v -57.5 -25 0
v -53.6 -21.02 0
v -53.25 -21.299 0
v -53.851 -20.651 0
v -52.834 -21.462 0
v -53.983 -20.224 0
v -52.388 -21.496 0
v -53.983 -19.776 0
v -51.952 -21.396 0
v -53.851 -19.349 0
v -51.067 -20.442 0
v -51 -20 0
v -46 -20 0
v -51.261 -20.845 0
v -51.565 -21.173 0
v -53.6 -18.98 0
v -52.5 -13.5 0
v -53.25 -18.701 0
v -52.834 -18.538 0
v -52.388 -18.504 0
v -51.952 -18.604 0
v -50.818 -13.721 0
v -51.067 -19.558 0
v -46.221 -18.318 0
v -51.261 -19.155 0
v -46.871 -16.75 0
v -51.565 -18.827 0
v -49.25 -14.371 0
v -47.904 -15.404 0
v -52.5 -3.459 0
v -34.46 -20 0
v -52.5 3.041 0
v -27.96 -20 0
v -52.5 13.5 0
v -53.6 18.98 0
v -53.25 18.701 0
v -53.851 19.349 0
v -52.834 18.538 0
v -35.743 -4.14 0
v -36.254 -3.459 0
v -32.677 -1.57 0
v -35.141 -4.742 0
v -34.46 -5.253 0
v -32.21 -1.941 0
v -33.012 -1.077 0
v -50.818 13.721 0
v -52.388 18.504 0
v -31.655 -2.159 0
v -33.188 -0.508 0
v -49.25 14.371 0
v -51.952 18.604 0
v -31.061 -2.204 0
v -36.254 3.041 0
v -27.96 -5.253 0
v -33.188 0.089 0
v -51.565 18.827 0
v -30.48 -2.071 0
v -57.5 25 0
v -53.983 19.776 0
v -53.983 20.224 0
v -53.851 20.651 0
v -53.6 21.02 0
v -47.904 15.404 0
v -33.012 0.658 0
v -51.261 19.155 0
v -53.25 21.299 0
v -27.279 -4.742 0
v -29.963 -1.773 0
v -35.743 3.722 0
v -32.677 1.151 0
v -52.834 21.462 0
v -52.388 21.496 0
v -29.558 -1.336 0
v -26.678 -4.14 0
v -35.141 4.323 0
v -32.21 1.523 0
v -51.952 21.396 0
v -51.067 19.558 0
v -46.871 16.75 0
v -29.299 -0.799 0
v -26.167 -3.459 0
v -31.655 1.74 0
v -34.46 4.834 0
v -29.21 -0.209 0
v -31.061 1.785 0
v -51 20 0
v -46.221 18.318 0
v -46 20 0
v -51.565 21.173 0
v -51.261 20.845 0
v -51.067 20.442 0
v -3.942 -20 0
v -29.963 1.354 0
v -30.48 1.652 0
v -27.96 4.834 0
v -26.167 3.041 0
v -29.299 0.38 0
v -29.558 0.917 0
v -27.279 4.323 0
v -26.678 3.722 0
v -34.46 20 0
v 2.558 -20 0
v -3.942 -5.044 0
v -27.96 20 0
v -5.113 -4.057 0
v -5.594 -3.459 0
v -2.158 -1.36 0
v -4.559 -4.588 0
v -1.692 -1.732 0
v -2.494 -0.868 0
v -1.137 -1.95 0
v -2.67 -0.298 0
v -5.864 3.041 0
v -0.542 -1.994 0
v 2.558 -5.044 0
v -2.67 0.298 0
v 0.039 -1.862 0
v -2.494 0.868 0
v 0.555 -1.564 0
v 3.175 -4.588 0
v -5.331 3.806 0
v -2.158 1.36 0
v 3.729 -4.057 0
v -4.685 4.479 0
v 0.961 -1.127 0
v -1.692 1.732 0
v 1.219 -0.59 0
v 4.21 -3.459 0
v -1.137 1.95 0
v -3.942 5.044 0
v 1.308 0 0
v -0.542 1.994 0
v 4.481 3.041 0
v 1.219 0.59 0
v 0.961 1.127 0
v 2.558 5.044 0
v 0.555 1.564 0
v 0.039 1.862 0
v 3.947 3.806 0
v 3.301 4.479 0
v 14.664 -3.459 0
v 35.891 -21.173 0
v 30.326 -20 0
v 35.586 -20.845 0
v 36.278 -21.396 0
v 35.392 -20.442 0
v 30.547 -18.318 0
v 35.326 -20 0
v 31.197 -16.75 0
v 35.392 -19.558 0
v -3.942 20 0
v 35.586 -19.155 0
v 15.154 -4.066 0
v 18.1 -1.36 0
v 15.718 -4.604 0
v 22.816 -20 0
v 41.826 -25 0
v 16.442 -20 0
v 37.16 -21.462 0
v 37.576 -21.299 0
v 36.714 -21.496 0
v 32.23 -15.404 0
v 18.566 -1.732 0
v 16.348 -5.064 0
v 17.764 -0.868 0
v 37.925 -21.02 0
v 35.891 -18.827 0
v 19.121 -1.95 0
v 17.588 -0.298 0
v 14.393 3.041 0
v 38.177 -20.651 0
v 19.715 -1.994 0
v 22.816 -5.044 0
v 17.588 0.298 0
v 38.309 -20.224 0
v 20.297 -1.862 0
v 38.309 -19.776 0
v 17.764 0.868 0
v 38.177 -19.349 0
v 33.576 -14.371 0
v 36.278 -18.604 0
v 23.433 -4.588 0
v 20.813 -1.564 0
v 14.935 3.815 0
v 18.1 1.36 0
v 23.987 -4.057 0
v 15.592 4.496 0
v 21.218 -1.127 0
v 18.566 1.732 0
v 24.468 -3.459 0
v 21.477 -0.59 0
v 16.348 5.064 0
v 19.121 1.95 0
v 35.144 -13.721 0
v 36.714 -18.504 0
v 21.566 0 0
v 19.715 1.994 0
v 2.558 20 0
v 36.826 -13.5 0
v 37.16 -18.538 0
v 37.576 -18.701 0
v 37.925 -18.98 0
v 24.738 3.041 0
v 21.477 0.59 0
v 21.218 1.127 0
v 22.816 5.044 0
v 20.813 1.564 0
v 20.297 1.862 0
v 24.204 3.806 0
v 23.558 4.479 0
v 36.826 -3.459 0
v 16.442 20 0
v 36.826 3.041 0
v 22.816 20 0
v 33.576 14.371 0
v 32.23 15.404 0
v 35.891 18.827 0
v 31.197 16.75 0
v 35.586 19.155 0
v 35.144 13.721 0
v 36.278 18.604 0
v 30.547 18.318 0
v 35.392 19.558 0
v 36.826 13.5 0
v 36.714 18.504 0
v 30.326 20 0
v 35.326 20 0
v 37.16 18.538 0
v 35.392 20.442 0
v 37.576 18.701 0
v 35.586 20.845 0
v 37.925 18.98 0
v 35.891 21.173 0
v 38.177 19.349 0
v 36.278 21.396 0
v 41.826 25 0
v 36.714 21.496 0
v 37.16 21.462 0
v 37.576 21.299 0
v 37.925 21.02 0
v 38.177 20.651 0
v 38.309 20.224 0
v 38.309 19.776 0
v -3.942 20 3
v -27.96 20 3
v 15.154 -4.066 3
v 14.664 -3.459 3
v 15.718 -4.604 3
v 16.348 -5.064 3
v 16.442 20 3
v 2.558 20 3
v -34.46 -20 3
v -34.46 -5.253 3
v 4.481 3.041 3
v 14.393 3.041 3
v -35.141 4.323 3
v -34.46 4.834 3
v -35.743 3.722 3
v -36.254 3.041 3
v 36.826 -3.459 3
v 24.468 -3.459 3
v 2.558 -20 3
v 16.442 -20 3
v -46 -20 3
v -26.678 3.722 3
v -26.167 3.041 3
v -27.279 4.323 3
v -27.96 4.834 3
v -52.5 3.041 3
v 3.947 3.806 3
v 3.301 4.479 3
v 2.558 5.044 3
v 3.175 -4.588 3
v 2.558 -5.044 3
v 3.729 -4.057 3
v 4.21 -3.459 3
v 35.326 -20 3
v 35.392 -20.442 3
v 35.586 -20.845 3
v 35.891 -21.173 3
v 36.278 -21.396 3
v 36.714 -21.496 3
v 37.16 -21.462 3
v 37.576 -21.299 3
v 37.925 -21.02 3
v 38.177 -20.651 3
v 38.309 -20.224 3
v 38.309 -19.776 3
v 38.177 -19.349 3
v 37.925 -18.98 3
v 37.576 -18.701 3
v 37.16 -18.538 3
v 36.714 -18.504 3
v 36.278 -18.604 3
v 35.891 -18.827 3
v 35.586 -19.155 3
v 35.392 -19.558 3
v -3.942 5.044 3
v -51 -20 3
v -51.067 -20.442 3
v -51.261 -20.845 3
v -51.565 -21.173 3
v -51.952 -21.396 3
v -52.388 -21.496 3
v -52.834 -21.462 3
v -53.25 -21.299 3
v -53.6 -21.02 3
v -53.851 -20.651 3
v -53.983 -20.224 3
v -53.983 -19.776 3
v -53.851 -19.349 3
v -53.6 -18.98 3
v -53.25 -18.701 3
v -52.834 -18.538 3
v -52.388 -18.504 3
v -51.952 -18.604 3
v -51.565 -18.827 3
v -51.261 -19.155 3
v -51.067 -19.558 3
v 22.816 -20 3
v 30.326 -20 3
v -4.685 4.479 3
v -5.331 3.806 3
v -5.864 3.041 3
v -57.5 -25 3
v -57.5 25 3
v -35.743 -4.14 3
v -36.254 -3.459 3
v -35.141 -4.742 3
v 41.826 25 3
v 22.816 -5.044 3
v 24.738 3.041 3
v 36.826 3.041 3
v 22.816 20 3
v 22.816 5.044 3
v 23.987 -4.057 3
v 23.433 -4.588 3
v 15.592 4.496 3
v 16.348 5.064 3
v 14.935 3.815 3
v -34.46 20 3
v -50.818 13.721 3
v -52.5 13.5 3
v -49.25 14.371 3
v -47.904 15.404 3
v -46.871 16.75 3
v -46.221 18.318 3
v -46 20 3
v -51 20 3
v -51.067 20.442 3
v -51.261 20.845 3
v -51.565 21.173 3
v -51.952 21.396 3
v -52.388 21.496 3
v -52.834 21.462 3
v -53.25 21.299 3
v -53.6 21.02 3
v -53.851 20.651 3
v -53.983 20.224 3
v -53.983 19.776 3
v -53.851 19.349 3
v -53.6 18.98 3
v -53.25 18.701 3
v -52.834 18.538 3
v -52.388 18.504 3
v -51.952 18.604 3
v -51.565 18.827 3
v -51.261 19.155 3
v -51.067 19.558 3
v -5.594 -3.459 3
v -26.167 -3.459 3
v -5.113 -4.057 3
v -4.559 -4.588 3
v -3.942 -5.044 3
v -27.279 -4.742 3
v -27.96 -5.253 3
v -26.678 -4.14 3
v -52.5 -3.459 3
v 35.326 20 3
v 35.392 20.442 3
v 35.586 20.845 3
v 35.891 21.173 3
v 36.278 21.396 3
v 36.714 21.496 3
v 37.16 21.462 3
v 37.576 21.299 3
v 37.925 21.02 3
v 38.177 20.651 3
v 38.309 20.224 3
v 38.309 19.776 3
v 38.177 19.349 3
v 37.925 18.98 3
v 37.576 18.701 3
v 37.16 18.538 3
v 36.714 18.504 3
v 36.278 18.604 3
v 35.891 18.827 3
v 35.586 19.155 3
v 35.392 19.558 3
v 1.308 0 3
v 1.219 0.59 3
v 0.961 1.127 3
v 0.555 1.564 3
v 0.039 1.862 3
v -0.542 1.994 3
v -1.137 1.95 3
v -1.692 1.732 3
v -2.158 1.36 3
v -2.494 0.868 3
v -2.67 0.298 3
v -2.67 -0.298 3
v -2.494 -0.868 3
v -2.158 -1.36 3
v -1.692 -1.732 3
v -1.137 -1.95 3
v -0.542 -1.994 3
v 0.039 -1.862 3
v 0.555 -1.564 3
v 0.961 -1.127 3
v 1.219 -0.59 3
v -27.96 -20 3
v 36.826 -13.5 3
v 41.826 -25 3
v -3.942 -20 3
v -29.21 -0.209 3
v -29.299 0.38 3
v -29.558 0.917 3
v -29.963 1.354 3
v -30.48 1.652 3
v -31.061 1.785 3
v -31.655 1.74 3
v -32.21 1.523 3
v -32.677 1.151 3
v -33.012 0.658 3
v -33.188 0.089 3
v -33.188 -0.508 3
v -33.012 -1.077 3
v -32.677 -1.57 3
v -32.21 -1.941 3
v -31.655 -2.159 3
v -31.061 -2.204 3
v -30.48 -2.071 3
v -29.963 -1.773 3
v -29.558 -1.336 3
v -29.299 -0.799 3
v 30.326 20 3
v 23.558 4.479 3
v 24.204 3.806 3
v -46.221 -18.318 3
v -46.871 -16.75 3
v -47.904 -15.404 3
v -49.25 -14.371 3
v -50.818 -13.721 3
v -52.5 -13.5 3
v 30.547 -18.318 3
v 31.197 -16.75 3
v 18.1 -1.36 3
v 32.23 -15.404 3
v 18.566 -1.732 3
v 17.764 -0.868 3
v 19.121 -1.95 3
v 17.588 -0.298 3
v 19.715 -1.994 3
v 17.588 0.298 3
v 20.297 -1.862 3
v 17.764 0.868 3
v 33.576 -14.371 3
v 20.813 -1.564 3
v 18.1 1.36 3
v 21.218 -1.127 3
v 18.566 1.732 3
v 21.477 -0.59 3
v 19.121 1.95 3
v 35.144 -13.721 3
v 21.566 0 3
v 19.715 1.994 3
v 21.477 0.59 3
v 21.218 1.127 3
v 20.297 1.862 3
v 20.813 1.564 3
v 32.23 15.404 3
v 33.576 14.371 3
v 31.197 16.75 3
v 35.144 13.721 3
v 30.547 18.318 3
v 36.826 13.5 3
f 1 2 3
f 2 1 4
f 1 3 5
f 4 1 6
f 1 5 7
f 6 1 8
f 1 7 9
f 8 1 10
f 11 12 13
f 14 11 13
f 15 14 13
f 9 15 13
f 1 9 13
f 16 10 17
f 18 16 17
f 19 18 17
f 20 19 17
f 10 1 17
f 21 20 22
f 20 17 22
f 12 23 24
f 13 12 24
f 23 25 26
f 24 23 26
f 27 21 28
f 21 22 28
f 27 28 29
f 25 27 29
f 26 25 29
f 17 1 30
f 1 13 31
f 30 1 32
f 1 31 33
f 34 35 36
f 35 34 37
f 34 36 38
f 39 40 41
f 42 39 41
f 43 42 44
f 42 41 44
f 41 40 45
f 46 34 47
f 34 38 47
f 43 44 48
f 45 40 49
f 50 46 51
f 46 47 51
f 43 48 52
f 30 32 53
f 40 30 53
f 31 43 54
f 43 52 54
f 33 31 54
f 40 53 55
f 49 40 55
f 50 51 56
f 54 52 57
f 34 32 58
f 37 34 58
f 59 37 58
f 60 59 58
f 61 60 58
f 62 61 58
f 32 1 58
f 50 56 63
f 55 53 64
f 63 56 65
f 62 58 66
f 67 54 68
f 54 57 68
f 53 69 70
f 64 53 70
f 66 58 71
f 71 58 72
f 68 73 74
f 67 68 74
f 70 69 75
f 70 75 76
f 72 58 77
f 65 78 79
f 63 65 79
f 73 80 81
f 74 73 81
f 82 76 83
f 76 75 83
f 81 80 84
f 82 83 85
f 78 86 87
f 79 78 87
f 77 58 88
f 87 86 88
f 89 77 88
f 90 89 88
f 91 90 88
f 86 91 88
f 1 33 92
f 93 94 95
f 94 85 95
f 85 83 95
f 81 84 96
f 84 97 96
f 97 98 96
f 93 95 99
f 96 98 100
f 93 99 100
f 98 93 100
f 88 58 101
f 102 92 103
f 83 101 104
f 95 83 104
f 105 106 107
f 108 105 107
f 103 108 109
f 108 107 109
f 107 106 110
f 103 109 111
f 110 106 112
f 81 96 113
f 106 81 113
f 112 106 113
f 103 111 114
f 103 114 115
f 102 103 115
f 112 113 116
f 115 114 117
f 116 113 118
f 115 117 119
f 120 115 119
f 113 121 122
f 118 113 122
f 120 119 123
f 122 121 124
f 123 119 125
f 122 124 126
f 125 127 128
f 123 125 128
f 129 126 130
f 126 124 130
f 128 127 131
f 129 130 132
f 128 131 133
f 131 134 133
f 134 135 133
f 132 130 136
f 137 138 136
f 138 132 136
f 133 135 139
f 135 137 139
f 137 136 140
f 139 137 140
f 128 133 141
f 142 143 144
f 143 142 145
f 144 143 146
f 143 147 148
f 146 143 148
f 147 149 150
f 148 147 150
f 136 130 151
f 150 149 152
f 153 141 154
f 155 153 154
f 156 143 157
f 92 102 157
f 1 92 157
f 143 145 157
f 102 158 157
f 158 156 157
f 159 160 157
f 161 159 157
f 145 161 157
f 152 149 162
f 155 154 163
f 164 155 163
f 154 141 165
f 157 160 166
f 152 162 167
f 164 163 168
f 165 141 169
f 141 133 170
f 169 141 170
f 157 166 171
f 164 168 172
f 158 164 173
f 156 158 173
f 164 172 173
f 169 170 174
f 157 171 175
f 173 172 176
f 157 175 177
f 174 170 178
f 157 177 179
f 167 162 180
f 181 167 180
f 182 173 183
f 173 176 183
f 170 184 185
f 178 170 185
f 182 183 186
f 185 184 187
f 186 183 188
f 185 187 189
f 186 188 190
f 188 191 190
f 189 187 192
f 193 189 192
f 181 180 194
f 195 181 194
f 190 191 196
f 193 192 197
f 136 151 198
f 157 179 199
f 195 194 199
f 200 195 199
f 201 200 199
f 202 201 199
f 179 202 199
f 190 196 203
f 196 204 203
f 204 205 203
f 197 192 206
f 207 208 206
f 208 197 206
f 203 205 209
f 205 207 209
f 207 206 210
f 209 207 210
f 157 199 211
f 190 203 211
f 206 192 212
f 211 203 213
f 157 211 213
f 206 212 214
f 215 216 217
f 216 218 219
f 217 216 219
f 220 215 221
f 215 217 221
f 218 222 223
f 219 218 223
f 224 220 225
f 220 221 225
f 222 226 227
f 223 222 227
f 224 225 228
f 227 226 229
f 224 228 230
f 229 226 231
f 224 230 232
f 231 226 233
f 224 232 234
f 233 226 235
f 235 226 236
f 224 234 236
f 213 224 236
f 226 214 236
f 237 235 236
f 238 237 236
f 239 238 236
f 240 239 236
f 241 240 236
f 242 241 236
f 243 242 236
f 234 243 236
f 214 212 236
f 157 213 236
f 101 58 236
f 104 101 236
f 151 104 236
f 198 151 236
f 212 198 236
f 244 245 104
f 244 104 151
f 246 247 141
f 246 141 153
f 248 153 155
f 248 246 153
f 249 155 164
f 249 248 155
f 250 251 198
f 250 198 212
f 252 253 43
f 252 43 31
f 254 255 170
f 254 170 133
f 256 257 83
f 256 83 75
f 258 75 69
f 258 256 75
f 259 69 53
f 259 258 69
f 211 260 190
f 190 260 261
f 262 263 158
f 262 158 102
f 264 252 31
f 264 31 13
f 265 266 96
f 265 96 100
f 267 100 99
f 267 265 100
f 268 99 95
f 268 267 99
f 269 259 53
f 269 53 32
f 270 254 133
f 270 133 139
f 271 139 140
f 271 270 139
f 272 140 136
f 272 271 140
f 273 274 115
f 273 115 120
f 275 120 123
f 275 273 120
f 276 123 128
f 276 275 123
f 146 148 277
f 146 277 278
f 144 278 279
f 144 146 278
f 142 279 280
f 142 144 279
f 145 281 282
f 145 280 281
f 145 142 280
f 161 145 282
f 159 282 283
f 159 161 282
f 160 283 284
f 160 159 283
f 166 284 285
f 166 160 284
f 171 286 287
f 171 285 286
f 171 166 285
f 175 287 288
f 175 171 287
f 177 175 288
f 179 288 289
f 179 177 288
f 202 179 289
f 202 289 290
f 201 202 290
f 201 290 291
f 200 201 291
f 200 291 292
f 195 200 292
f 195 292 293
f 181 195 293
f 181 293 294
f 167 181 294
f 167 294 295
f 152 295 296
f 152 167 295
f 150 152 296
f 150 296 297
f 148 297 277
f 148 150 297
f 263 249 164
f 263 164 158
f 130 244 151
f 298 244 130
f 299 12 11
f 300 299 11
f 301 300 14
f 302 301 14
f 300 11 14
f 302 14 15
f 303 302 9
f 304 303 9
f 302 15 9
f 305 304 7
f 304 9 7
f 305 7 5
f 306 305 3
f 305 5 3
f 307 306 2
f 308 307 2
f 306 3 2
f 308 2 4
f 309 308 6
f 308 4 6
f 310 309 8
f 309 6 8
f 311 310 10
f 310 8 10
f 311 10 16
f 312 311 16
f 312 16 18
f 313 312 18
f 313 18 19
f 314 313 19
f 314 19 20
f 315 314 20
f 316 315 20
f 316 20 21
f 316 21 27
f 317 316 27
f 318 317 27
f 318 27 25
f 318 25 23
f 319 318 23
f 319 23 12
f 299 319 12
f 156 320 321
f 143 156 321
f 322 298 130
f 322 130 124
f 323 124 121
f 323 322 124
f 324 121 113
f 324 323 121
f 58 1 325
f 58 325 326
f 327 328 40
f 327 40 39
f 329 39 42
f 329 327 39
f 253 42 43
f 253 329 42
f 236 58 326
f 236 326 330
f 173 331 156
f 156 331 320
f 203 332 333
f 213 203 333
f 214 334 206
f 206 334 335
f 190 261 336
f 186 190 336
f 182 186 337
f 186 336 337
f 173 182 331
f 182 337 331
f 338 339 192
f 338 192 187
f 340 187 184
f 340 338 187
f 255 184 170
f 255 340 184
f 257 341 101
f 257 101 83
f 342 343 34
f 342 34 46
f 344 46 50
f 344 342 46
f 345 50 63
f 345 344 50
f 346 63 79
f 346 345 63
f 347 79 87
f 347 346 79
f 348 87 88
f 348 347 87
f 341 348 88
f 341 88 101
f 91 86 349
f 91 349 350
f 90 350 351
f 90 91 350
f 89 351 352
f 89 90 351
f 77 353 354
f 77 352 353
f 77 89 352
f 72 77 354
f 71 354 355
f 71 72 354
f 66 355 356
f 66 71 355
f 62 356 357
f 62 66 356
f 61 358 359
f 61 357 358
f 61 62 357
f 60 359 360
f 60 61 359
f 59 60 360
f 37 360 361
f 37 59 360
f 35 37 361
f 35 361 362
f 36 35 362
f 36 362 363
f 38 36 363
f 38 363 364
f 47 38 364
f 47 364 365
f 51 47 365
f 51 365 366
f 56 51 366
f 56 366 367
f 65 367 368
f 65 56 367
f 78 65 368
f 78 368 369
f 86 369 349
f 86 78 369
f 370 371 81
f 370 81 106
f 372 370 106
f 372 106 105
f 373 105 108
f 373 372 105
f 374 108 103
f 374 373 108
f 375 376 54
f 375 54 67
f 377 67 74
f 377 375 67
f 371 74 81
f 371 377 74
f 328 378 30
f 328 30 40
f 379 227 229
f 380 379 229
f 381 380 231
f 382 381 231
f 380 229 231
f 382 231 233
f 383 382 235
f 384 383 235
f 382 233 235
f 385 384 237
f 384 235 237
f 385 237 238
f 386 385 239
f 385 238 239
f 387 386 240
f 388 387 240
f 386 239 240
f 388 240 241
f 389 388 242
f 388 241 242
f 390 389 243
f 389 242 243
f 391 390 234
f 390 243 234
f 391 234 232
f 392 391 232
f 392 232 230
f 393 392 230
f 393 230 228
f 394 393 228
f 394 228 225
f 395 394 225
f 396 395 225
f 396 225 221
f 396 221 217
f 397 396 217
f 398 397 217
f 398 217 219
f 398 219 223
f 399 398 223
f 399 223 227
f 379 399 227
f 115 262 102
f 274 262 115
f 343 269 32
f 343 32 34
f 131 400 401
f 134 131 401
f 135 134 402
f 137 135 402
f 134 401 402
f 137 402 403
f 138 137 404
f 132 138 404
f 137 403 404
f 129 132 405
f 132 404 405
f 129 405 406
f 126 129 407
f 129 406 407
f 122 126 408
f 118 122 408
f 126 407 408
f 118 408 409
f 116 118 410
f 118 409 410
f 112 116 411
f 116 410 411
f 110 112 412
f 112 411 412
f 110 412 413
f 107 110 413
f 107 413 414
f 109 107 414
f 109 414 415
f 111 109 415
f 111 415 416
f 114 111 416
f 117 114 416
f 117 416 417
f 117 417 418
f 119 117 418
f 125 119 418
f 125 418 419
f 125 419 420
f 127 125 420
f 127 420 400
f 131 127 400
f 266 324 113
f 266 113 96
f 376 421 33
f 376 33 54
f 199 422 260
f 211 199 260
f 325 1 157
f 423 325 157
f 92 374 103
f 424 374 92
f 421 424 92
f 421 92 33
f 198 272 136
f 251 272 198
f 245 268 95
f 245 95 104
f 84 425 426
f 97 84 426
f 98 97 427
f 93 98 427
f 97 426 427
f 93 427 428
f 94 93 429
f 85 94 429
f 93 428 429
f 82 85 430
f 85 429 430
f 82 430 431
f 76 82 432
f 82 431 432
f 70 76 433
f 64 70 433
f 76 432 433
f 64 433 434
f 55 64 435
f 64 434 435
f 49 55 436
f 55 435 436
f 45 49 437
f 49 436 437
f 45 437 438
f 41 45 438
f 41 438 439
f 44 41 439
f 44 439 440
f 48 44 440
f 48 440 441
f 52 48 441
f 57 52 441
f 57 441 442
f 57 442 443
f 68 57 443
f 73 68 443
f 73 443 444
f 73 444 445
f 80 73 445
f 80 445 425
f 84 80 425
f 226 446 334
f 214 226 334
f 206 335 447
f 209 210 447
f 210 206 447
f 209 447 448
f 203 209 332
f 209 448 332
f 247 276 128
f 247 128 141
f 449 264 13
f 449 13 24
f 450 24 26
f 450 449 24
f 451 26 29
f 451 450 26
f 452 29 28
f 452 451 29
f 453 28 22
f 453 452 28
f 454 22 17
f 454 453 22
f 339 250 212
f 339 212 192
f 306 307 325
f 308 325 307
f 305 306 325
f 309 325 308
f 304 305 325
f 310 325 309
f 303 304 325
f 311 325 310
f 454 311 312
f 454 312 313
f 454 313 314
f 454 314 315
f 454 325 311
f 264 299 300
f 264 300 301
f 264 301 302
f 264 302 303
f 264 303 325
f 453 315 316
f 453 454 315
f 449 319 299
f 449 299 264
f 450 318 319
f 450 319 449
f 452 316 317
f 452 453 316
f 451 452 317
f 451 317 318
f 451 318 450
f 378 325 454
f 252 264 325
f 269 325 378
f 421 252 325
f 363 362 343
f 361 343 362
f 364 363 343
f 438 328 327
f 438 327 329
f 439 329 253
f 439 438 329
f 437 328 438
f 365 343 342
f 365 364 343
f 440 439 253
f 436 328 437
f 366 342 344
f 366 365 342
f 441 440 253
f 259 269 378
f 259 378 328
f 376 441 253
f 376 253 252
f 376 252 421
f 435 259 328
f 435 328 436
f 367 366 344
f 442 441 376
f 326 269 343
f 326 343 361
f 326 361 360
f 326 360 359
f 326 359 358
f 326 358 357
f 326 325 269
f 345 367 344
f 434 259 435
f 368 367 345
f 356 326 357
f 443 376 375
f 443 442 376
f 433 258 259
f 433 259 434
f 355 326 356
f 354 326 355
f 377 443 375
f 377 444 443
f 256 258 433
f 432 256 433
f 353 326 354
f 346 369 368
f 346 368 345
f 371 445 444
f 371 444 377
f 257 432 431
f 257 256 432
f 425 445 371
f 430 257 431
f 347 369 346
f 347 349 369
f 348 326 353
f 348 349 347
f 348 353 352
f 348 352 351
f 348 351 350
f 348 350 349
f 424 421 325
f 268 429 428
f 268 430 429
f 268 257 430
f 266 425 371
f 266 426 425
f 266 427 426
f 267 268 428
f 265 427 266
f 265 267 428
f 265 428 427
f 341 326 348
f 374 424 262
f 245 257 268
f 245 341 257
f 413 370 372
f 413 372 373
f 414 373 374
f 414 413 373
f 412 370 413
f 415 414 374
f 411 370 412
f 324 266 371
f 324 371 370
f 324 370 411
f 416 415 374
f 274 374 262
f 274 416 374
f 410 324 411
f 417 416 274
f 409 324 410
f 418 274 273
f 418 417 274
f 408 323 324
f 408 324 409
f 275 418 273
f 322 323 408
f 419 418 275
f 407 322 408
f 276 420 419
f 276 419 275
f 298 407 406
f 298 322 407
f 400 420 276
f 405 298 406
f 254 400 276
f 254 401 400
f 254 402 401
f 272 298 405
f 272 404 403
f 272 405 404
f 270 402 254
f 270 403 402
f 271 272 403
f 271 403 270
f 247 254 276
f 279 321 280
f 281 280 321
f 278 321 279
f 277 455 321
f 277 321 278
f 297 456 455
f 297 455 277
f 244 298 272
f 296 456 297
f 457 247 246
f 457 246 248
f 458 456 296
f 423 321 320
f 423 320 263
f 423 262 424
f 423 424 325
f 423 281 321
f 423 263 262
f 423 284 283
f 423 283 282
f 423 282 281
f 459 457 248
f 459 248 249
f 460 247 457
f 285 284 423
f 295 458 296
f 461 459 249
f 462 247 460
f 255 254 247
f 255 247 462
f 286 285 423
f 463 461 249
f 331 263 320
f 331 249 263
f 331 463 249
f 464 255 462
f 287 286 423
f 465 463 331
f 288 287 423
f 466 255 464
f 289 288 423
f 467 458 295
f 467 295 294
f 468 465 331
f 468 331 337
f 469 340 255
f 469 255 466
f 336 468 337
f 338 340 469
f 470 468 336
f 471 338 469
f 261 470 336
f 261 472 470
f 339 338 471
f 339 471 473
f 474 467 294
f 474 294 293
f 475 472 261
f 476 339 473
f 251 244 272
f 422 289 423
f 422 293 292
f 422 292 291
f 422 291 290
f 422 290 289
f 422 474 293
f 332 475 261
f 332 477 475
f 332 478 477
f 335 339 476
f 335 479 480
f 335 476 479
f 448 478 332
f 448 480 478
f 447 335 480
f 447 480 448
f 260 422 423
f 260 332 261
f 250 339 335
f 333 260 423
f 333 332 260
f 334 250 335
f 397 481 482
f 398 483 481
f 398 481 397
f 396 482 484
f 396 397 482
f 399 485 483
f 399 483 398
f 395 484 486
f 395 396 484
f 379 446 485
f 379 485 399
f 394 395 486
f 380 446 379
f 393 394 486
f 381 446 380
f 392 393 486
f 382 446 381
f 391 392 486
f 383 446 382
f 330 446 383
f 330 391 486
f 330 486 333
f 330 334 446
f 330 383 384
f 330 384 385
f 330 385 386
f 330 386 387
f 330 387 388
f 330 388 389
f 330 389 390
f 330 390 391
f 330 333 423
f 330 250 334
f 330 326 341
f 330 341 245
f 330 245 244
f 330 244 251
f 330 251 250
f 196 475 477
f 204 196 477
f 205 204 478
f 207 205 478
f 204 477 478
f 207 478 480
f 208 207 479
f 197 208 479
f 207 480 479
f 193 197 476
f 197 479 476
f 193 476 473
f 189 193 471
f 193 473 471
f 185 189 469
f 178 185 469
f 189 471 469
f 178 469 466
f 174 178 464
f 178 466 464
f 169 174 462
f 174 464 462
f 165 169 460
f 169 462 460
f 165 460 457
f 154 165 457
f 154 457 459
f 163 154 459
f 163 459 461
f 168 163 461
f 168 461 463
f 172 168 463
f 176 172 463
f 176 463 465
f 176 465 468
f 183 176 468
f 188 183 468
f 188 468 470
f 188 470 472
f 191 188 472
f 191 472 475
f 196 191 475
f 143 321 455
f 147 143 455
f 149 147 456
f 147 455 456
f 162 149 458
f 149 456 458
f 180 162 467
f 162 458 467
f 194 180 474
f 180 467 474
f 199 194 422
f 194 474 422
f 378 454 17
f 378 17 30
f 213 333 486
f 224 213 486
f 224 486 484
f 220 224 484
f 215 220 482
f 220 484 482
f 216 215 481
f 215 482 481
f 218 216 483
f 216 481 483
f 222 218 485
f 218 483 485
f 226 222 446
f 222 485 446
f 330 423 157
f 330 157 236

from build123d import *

# Parameters (mm, degrees)
SKETCH1_W               = 115
SKETCH1_H               = 50
BOSS_EXTRUDE1_DEPTH     = 3
CUT_EXTRUDE1_START      = -4
SKETCH2_R               = 1.5
CUT_EXTRUDE1_DEPTH      = 5
SKETCH4_R               = 2
CUT_EXTRUDE2_DEPTH      = 4
SKETCH5_R               = 2
CUT_EXTRUDE3_DEPTH      = 10
SKETCH6_R               = 2
CUT_EXTRUDE4_DEPTH      = 10
SKETCH7_W               = 15.674157042
SKETCH7_H               = 50
CUT_EXTRUDE5_DEPTH      = 10
MIRROR2_START           = -4
MIRROR2_COPY_1_SKETCH_R = 1.5
MIRROR2_COPY_1_DEPTH    = 5
CUT_EXTRUDE6_DEPTH      = 10


with BuildPart() as part:
    # Sketch1 → Boss-Extrude1 (new body)
    with BuildSketch(Plane.XY):
        Rectangle(SKETCH1_W, SKETCH1_H)
    extrude(amount=BOSS_EXTRUDE1_DEPTH)

    # Sketch2 → Cut-Extrude1 (cut)
    with BuildSketch(Plane.XY.offset(3).offset(CUT_EXTRUDE1_START)):
        with Locations((-52.5, 20)):
            Circle(SKETCH2_R)
    cut_extrude1 = extrude(amount=CUT_EXTRUDE1_DEPTH, mode=Mode.SUBTRACT)

    # Sketch4 → Cut-Extrude2 (cut, through all)
    with BuildSketch(Plane.XY.offset(3)):
        with Locations((-31.210457155, -0.20944607)):
            Circle(SKETCH4_R)
    extrude(amount=-CUT_EXTRUDE2_DEPTH, mode=Mode.SUBTRACT)

    # Sketch5 → Cut-Extrude3 (cut)
    with BuildSketch(Plane.XY.offset(3)):
        with Locations((-0.691956257, 0)):
            Circle(SKETCH5_R)
    extrude(amount=-CUT_EXTRUDE3_DEPTH, mode=Mode.SUBTRACT)

    # Sketch6 → Cut-Extrude4 (cut)
    with BuildSketch(Plane.XY.offset(3)):
        with Locations((19.565842958, 0)):
            Circle(SKETCH6_R)
    extrude(amount=-CUT_EXTRUDE4_DEPTH, mode=Mode.SUBTRACT)

    # Sketch7 → Cut-Extrude5 (cut)
    with BuildSketch(Plane.XY.offset(3)):
        with Locations((49.662921479, 0)):
            Rectangle(SKETCH7_W, SKETCH7_H)
    extrude(amount=-CUT_EXTRUDE5_DEPTH, mode=Mode.SUBTRACT)

    # Mirror1: Cut-Extrude1 across plane
    add(cut_extrude1.mirror(Plane.ZY.offset(7.837078521)), mode=Mode.SUBTRACT)

    # Mirror2: Cut-Extrude1 across plane
    add(cut_extrude1.mirror(Plane.ZX), mode=Mode.SUBTRACT)

    # Mirror2 copy 1 sketch → Mirror2 copy 1 (cut)
    with BuildSketch(Plane(origin=(-15.674157042, 0, 3), x_dir=(-1, 0, 0), z_dir=(0, 0, 1)).offset(MIRROR2_START)):
        with Locations((-52.5, 20)):
            Circle(MIRROR2_COPY_1_SKETCH_R)
    extrude(amount=MIRROR2_COPY_1_DEPTH, mode=Mode.SUBTRACT)

    # Sketch8 → Cut-Extrude6 (cut)
    with BuildSketch(Plane.XY.offset(3)):
        with BuildLine():
            ThreePointArc((-52.5, 13.5), (-47.903805922, 15.403805922), (-46, 20))
            Line((-46, 20), (-34.460457155, 20))
            Line((-34.460457155, 20), (-34.460457155, 4.834114181))
            ThreePointArc((-34.460457155, 4.834114181), (-35.453097842, 4.033194618), (-36.254017405, 3.04055393))
            Line((-36.254017405, 3.04055393), (-52.5, 3.04055393))
            Line((-52.5, 3.04055393), (-52.5, 13.5))
        make_face()
        with BuildLine():
            ThreePointArc((-3.941956257, 5.04356025), (-5.020668226, 4.15478672), (-5.864482893, 3.04055393))
            Line((-5.864482893, 3.04055393), (-26.166896904, 3.04055393))
            ThreePointArc((-26.166896904, 3.04055393), (-26.967816468, 4.033194618), (-27.960457155, 4.834114181))
            Line((-27.960457155, 4.834114181), (-27.960457155, 20))
            Line((-27.960457155, 20), (-3.941956257, 20))
            Line((-3.941956257, 20), (-3.941956257, 5.04356025))
        make_face()
        with BuildLine():
            ThreePointArc((4.480570379, 3.04055393), (3.636755712, 4.15478672), (2.558043743, 5.04356025))
            Line((2.558043743, 5.04356025), (2.558043743, 20))
            Line((2.558043743, 20), (16.44194335, 20))
            Line((16.44194335, 20), (16.347771528, 5.063992128))
            ThreePointArc((16.347771528, 5.063992128), (15.250277003, 4.168439815), (14.393316322, 3.04055393))
            Line((14.393316322, 3.04055393), (4.480570379, 3.04055393))
        make_face()
        with BuildLine():
            Line((36.825842958, 3.04055393), (36.825842958, 13.5))
            ThreePointArc((36.825842958, 13.5), (32.22964888, 15.403805922), (30.325842958, 20))
            Line((30.325842958, 20), (22.815842958, 20))
            Line((22.815842958, 20), (22.815842958, 5.04356025))
            ThreePointArc((22.815842958, 5.04356025), (23.894554927, 4.15478672), (24.738369593, 3.04055393))
            Line((24.738369593, 3.04055393), (36.825842958, 3.04055393))
        make_face()
        with BuildLine():
            Line((36.825842958, -13.5), (36.825842958, -3.45944607))
            Line((36.825842958, -3.45944607), (24.468111095, -3.45944607))
            ThreePointArc((24.468111095, -3.45944607), (23.718218589, -4.331024892), (22.815842958, -5.04356025))
            Line((22.815842958, -5.04356025), (22.815842958, -20))
            Line((22.815842958, -20), (30.325842958, -20))
            ThreePointArc((30.325842958, -20), (32.22964888, -15.403805922), (36.825842958, -13.5))
        make_face()
        with BuildLine():
            ThreePointArc((14.66357482, -3.45944607), (15.427169174, -4.344120085), (16.347771528, -5.063992128))
            Line((16.347771528, -5.063992128), (16.44194335, -20))
            Line((16.44194335, -20), (2.558043743, -20))
            Line((2.558043743, -20), (2.558043743, -5.04356025))
            ThreePointArc((2.558043743, -5.04356025), (3.460419374, -4.331024892), (4.21031188, -3.45944607))
            Line((4.21031188, -3.45944607), (14.66357482, -3.45944607))
        make_face()
        with BuildLine():
            ThreePointArc((-27.960457155, -5.25300632), (-26.967816468, -4.452086757), (-26.166896904, -3.45944607))
            Line((-26.166896904, -3.45944607), (-5.594224394, -3.45944607))
            ThreePointArc((-5.594224394, -3.45944607), (-4.844331888, -4.331024892), (-3.941956257, -5.04356025))
            Line((-3.941956257, -5.04356025), (-3.941956257, -20))
            Line((-3.941956257, -20), (-27.960457155, -20))
            Line((-27.960457155, -20), (-27.960457155, -5.25300632))
        make_face()
        with BuildLine():
            ThreePointArc((-36.254017405, -3.45944607), (-35.453097842, -4.452086757), (-34.460457155, -5.25300632))
            Line((-34.460457155, -5.25300632), (-34.460457155, -20))
            Line((-34.460457155, -20), (-46, -20))
            ThreePointArc((-46, -20), (-47.903805922, -15.403805922), (-52.5, -13.5))
            Line((-52.5, -13.5), (-52.5, -3.45944607))
            Line((-52.5, -3.45944607), (-36.254017405, -3.45944607))
        make_face()
    extrude(amount=-CUT_EXTRUDE6_DEPTH, mode=Mode.SUBTRACT)


solid = part.part
